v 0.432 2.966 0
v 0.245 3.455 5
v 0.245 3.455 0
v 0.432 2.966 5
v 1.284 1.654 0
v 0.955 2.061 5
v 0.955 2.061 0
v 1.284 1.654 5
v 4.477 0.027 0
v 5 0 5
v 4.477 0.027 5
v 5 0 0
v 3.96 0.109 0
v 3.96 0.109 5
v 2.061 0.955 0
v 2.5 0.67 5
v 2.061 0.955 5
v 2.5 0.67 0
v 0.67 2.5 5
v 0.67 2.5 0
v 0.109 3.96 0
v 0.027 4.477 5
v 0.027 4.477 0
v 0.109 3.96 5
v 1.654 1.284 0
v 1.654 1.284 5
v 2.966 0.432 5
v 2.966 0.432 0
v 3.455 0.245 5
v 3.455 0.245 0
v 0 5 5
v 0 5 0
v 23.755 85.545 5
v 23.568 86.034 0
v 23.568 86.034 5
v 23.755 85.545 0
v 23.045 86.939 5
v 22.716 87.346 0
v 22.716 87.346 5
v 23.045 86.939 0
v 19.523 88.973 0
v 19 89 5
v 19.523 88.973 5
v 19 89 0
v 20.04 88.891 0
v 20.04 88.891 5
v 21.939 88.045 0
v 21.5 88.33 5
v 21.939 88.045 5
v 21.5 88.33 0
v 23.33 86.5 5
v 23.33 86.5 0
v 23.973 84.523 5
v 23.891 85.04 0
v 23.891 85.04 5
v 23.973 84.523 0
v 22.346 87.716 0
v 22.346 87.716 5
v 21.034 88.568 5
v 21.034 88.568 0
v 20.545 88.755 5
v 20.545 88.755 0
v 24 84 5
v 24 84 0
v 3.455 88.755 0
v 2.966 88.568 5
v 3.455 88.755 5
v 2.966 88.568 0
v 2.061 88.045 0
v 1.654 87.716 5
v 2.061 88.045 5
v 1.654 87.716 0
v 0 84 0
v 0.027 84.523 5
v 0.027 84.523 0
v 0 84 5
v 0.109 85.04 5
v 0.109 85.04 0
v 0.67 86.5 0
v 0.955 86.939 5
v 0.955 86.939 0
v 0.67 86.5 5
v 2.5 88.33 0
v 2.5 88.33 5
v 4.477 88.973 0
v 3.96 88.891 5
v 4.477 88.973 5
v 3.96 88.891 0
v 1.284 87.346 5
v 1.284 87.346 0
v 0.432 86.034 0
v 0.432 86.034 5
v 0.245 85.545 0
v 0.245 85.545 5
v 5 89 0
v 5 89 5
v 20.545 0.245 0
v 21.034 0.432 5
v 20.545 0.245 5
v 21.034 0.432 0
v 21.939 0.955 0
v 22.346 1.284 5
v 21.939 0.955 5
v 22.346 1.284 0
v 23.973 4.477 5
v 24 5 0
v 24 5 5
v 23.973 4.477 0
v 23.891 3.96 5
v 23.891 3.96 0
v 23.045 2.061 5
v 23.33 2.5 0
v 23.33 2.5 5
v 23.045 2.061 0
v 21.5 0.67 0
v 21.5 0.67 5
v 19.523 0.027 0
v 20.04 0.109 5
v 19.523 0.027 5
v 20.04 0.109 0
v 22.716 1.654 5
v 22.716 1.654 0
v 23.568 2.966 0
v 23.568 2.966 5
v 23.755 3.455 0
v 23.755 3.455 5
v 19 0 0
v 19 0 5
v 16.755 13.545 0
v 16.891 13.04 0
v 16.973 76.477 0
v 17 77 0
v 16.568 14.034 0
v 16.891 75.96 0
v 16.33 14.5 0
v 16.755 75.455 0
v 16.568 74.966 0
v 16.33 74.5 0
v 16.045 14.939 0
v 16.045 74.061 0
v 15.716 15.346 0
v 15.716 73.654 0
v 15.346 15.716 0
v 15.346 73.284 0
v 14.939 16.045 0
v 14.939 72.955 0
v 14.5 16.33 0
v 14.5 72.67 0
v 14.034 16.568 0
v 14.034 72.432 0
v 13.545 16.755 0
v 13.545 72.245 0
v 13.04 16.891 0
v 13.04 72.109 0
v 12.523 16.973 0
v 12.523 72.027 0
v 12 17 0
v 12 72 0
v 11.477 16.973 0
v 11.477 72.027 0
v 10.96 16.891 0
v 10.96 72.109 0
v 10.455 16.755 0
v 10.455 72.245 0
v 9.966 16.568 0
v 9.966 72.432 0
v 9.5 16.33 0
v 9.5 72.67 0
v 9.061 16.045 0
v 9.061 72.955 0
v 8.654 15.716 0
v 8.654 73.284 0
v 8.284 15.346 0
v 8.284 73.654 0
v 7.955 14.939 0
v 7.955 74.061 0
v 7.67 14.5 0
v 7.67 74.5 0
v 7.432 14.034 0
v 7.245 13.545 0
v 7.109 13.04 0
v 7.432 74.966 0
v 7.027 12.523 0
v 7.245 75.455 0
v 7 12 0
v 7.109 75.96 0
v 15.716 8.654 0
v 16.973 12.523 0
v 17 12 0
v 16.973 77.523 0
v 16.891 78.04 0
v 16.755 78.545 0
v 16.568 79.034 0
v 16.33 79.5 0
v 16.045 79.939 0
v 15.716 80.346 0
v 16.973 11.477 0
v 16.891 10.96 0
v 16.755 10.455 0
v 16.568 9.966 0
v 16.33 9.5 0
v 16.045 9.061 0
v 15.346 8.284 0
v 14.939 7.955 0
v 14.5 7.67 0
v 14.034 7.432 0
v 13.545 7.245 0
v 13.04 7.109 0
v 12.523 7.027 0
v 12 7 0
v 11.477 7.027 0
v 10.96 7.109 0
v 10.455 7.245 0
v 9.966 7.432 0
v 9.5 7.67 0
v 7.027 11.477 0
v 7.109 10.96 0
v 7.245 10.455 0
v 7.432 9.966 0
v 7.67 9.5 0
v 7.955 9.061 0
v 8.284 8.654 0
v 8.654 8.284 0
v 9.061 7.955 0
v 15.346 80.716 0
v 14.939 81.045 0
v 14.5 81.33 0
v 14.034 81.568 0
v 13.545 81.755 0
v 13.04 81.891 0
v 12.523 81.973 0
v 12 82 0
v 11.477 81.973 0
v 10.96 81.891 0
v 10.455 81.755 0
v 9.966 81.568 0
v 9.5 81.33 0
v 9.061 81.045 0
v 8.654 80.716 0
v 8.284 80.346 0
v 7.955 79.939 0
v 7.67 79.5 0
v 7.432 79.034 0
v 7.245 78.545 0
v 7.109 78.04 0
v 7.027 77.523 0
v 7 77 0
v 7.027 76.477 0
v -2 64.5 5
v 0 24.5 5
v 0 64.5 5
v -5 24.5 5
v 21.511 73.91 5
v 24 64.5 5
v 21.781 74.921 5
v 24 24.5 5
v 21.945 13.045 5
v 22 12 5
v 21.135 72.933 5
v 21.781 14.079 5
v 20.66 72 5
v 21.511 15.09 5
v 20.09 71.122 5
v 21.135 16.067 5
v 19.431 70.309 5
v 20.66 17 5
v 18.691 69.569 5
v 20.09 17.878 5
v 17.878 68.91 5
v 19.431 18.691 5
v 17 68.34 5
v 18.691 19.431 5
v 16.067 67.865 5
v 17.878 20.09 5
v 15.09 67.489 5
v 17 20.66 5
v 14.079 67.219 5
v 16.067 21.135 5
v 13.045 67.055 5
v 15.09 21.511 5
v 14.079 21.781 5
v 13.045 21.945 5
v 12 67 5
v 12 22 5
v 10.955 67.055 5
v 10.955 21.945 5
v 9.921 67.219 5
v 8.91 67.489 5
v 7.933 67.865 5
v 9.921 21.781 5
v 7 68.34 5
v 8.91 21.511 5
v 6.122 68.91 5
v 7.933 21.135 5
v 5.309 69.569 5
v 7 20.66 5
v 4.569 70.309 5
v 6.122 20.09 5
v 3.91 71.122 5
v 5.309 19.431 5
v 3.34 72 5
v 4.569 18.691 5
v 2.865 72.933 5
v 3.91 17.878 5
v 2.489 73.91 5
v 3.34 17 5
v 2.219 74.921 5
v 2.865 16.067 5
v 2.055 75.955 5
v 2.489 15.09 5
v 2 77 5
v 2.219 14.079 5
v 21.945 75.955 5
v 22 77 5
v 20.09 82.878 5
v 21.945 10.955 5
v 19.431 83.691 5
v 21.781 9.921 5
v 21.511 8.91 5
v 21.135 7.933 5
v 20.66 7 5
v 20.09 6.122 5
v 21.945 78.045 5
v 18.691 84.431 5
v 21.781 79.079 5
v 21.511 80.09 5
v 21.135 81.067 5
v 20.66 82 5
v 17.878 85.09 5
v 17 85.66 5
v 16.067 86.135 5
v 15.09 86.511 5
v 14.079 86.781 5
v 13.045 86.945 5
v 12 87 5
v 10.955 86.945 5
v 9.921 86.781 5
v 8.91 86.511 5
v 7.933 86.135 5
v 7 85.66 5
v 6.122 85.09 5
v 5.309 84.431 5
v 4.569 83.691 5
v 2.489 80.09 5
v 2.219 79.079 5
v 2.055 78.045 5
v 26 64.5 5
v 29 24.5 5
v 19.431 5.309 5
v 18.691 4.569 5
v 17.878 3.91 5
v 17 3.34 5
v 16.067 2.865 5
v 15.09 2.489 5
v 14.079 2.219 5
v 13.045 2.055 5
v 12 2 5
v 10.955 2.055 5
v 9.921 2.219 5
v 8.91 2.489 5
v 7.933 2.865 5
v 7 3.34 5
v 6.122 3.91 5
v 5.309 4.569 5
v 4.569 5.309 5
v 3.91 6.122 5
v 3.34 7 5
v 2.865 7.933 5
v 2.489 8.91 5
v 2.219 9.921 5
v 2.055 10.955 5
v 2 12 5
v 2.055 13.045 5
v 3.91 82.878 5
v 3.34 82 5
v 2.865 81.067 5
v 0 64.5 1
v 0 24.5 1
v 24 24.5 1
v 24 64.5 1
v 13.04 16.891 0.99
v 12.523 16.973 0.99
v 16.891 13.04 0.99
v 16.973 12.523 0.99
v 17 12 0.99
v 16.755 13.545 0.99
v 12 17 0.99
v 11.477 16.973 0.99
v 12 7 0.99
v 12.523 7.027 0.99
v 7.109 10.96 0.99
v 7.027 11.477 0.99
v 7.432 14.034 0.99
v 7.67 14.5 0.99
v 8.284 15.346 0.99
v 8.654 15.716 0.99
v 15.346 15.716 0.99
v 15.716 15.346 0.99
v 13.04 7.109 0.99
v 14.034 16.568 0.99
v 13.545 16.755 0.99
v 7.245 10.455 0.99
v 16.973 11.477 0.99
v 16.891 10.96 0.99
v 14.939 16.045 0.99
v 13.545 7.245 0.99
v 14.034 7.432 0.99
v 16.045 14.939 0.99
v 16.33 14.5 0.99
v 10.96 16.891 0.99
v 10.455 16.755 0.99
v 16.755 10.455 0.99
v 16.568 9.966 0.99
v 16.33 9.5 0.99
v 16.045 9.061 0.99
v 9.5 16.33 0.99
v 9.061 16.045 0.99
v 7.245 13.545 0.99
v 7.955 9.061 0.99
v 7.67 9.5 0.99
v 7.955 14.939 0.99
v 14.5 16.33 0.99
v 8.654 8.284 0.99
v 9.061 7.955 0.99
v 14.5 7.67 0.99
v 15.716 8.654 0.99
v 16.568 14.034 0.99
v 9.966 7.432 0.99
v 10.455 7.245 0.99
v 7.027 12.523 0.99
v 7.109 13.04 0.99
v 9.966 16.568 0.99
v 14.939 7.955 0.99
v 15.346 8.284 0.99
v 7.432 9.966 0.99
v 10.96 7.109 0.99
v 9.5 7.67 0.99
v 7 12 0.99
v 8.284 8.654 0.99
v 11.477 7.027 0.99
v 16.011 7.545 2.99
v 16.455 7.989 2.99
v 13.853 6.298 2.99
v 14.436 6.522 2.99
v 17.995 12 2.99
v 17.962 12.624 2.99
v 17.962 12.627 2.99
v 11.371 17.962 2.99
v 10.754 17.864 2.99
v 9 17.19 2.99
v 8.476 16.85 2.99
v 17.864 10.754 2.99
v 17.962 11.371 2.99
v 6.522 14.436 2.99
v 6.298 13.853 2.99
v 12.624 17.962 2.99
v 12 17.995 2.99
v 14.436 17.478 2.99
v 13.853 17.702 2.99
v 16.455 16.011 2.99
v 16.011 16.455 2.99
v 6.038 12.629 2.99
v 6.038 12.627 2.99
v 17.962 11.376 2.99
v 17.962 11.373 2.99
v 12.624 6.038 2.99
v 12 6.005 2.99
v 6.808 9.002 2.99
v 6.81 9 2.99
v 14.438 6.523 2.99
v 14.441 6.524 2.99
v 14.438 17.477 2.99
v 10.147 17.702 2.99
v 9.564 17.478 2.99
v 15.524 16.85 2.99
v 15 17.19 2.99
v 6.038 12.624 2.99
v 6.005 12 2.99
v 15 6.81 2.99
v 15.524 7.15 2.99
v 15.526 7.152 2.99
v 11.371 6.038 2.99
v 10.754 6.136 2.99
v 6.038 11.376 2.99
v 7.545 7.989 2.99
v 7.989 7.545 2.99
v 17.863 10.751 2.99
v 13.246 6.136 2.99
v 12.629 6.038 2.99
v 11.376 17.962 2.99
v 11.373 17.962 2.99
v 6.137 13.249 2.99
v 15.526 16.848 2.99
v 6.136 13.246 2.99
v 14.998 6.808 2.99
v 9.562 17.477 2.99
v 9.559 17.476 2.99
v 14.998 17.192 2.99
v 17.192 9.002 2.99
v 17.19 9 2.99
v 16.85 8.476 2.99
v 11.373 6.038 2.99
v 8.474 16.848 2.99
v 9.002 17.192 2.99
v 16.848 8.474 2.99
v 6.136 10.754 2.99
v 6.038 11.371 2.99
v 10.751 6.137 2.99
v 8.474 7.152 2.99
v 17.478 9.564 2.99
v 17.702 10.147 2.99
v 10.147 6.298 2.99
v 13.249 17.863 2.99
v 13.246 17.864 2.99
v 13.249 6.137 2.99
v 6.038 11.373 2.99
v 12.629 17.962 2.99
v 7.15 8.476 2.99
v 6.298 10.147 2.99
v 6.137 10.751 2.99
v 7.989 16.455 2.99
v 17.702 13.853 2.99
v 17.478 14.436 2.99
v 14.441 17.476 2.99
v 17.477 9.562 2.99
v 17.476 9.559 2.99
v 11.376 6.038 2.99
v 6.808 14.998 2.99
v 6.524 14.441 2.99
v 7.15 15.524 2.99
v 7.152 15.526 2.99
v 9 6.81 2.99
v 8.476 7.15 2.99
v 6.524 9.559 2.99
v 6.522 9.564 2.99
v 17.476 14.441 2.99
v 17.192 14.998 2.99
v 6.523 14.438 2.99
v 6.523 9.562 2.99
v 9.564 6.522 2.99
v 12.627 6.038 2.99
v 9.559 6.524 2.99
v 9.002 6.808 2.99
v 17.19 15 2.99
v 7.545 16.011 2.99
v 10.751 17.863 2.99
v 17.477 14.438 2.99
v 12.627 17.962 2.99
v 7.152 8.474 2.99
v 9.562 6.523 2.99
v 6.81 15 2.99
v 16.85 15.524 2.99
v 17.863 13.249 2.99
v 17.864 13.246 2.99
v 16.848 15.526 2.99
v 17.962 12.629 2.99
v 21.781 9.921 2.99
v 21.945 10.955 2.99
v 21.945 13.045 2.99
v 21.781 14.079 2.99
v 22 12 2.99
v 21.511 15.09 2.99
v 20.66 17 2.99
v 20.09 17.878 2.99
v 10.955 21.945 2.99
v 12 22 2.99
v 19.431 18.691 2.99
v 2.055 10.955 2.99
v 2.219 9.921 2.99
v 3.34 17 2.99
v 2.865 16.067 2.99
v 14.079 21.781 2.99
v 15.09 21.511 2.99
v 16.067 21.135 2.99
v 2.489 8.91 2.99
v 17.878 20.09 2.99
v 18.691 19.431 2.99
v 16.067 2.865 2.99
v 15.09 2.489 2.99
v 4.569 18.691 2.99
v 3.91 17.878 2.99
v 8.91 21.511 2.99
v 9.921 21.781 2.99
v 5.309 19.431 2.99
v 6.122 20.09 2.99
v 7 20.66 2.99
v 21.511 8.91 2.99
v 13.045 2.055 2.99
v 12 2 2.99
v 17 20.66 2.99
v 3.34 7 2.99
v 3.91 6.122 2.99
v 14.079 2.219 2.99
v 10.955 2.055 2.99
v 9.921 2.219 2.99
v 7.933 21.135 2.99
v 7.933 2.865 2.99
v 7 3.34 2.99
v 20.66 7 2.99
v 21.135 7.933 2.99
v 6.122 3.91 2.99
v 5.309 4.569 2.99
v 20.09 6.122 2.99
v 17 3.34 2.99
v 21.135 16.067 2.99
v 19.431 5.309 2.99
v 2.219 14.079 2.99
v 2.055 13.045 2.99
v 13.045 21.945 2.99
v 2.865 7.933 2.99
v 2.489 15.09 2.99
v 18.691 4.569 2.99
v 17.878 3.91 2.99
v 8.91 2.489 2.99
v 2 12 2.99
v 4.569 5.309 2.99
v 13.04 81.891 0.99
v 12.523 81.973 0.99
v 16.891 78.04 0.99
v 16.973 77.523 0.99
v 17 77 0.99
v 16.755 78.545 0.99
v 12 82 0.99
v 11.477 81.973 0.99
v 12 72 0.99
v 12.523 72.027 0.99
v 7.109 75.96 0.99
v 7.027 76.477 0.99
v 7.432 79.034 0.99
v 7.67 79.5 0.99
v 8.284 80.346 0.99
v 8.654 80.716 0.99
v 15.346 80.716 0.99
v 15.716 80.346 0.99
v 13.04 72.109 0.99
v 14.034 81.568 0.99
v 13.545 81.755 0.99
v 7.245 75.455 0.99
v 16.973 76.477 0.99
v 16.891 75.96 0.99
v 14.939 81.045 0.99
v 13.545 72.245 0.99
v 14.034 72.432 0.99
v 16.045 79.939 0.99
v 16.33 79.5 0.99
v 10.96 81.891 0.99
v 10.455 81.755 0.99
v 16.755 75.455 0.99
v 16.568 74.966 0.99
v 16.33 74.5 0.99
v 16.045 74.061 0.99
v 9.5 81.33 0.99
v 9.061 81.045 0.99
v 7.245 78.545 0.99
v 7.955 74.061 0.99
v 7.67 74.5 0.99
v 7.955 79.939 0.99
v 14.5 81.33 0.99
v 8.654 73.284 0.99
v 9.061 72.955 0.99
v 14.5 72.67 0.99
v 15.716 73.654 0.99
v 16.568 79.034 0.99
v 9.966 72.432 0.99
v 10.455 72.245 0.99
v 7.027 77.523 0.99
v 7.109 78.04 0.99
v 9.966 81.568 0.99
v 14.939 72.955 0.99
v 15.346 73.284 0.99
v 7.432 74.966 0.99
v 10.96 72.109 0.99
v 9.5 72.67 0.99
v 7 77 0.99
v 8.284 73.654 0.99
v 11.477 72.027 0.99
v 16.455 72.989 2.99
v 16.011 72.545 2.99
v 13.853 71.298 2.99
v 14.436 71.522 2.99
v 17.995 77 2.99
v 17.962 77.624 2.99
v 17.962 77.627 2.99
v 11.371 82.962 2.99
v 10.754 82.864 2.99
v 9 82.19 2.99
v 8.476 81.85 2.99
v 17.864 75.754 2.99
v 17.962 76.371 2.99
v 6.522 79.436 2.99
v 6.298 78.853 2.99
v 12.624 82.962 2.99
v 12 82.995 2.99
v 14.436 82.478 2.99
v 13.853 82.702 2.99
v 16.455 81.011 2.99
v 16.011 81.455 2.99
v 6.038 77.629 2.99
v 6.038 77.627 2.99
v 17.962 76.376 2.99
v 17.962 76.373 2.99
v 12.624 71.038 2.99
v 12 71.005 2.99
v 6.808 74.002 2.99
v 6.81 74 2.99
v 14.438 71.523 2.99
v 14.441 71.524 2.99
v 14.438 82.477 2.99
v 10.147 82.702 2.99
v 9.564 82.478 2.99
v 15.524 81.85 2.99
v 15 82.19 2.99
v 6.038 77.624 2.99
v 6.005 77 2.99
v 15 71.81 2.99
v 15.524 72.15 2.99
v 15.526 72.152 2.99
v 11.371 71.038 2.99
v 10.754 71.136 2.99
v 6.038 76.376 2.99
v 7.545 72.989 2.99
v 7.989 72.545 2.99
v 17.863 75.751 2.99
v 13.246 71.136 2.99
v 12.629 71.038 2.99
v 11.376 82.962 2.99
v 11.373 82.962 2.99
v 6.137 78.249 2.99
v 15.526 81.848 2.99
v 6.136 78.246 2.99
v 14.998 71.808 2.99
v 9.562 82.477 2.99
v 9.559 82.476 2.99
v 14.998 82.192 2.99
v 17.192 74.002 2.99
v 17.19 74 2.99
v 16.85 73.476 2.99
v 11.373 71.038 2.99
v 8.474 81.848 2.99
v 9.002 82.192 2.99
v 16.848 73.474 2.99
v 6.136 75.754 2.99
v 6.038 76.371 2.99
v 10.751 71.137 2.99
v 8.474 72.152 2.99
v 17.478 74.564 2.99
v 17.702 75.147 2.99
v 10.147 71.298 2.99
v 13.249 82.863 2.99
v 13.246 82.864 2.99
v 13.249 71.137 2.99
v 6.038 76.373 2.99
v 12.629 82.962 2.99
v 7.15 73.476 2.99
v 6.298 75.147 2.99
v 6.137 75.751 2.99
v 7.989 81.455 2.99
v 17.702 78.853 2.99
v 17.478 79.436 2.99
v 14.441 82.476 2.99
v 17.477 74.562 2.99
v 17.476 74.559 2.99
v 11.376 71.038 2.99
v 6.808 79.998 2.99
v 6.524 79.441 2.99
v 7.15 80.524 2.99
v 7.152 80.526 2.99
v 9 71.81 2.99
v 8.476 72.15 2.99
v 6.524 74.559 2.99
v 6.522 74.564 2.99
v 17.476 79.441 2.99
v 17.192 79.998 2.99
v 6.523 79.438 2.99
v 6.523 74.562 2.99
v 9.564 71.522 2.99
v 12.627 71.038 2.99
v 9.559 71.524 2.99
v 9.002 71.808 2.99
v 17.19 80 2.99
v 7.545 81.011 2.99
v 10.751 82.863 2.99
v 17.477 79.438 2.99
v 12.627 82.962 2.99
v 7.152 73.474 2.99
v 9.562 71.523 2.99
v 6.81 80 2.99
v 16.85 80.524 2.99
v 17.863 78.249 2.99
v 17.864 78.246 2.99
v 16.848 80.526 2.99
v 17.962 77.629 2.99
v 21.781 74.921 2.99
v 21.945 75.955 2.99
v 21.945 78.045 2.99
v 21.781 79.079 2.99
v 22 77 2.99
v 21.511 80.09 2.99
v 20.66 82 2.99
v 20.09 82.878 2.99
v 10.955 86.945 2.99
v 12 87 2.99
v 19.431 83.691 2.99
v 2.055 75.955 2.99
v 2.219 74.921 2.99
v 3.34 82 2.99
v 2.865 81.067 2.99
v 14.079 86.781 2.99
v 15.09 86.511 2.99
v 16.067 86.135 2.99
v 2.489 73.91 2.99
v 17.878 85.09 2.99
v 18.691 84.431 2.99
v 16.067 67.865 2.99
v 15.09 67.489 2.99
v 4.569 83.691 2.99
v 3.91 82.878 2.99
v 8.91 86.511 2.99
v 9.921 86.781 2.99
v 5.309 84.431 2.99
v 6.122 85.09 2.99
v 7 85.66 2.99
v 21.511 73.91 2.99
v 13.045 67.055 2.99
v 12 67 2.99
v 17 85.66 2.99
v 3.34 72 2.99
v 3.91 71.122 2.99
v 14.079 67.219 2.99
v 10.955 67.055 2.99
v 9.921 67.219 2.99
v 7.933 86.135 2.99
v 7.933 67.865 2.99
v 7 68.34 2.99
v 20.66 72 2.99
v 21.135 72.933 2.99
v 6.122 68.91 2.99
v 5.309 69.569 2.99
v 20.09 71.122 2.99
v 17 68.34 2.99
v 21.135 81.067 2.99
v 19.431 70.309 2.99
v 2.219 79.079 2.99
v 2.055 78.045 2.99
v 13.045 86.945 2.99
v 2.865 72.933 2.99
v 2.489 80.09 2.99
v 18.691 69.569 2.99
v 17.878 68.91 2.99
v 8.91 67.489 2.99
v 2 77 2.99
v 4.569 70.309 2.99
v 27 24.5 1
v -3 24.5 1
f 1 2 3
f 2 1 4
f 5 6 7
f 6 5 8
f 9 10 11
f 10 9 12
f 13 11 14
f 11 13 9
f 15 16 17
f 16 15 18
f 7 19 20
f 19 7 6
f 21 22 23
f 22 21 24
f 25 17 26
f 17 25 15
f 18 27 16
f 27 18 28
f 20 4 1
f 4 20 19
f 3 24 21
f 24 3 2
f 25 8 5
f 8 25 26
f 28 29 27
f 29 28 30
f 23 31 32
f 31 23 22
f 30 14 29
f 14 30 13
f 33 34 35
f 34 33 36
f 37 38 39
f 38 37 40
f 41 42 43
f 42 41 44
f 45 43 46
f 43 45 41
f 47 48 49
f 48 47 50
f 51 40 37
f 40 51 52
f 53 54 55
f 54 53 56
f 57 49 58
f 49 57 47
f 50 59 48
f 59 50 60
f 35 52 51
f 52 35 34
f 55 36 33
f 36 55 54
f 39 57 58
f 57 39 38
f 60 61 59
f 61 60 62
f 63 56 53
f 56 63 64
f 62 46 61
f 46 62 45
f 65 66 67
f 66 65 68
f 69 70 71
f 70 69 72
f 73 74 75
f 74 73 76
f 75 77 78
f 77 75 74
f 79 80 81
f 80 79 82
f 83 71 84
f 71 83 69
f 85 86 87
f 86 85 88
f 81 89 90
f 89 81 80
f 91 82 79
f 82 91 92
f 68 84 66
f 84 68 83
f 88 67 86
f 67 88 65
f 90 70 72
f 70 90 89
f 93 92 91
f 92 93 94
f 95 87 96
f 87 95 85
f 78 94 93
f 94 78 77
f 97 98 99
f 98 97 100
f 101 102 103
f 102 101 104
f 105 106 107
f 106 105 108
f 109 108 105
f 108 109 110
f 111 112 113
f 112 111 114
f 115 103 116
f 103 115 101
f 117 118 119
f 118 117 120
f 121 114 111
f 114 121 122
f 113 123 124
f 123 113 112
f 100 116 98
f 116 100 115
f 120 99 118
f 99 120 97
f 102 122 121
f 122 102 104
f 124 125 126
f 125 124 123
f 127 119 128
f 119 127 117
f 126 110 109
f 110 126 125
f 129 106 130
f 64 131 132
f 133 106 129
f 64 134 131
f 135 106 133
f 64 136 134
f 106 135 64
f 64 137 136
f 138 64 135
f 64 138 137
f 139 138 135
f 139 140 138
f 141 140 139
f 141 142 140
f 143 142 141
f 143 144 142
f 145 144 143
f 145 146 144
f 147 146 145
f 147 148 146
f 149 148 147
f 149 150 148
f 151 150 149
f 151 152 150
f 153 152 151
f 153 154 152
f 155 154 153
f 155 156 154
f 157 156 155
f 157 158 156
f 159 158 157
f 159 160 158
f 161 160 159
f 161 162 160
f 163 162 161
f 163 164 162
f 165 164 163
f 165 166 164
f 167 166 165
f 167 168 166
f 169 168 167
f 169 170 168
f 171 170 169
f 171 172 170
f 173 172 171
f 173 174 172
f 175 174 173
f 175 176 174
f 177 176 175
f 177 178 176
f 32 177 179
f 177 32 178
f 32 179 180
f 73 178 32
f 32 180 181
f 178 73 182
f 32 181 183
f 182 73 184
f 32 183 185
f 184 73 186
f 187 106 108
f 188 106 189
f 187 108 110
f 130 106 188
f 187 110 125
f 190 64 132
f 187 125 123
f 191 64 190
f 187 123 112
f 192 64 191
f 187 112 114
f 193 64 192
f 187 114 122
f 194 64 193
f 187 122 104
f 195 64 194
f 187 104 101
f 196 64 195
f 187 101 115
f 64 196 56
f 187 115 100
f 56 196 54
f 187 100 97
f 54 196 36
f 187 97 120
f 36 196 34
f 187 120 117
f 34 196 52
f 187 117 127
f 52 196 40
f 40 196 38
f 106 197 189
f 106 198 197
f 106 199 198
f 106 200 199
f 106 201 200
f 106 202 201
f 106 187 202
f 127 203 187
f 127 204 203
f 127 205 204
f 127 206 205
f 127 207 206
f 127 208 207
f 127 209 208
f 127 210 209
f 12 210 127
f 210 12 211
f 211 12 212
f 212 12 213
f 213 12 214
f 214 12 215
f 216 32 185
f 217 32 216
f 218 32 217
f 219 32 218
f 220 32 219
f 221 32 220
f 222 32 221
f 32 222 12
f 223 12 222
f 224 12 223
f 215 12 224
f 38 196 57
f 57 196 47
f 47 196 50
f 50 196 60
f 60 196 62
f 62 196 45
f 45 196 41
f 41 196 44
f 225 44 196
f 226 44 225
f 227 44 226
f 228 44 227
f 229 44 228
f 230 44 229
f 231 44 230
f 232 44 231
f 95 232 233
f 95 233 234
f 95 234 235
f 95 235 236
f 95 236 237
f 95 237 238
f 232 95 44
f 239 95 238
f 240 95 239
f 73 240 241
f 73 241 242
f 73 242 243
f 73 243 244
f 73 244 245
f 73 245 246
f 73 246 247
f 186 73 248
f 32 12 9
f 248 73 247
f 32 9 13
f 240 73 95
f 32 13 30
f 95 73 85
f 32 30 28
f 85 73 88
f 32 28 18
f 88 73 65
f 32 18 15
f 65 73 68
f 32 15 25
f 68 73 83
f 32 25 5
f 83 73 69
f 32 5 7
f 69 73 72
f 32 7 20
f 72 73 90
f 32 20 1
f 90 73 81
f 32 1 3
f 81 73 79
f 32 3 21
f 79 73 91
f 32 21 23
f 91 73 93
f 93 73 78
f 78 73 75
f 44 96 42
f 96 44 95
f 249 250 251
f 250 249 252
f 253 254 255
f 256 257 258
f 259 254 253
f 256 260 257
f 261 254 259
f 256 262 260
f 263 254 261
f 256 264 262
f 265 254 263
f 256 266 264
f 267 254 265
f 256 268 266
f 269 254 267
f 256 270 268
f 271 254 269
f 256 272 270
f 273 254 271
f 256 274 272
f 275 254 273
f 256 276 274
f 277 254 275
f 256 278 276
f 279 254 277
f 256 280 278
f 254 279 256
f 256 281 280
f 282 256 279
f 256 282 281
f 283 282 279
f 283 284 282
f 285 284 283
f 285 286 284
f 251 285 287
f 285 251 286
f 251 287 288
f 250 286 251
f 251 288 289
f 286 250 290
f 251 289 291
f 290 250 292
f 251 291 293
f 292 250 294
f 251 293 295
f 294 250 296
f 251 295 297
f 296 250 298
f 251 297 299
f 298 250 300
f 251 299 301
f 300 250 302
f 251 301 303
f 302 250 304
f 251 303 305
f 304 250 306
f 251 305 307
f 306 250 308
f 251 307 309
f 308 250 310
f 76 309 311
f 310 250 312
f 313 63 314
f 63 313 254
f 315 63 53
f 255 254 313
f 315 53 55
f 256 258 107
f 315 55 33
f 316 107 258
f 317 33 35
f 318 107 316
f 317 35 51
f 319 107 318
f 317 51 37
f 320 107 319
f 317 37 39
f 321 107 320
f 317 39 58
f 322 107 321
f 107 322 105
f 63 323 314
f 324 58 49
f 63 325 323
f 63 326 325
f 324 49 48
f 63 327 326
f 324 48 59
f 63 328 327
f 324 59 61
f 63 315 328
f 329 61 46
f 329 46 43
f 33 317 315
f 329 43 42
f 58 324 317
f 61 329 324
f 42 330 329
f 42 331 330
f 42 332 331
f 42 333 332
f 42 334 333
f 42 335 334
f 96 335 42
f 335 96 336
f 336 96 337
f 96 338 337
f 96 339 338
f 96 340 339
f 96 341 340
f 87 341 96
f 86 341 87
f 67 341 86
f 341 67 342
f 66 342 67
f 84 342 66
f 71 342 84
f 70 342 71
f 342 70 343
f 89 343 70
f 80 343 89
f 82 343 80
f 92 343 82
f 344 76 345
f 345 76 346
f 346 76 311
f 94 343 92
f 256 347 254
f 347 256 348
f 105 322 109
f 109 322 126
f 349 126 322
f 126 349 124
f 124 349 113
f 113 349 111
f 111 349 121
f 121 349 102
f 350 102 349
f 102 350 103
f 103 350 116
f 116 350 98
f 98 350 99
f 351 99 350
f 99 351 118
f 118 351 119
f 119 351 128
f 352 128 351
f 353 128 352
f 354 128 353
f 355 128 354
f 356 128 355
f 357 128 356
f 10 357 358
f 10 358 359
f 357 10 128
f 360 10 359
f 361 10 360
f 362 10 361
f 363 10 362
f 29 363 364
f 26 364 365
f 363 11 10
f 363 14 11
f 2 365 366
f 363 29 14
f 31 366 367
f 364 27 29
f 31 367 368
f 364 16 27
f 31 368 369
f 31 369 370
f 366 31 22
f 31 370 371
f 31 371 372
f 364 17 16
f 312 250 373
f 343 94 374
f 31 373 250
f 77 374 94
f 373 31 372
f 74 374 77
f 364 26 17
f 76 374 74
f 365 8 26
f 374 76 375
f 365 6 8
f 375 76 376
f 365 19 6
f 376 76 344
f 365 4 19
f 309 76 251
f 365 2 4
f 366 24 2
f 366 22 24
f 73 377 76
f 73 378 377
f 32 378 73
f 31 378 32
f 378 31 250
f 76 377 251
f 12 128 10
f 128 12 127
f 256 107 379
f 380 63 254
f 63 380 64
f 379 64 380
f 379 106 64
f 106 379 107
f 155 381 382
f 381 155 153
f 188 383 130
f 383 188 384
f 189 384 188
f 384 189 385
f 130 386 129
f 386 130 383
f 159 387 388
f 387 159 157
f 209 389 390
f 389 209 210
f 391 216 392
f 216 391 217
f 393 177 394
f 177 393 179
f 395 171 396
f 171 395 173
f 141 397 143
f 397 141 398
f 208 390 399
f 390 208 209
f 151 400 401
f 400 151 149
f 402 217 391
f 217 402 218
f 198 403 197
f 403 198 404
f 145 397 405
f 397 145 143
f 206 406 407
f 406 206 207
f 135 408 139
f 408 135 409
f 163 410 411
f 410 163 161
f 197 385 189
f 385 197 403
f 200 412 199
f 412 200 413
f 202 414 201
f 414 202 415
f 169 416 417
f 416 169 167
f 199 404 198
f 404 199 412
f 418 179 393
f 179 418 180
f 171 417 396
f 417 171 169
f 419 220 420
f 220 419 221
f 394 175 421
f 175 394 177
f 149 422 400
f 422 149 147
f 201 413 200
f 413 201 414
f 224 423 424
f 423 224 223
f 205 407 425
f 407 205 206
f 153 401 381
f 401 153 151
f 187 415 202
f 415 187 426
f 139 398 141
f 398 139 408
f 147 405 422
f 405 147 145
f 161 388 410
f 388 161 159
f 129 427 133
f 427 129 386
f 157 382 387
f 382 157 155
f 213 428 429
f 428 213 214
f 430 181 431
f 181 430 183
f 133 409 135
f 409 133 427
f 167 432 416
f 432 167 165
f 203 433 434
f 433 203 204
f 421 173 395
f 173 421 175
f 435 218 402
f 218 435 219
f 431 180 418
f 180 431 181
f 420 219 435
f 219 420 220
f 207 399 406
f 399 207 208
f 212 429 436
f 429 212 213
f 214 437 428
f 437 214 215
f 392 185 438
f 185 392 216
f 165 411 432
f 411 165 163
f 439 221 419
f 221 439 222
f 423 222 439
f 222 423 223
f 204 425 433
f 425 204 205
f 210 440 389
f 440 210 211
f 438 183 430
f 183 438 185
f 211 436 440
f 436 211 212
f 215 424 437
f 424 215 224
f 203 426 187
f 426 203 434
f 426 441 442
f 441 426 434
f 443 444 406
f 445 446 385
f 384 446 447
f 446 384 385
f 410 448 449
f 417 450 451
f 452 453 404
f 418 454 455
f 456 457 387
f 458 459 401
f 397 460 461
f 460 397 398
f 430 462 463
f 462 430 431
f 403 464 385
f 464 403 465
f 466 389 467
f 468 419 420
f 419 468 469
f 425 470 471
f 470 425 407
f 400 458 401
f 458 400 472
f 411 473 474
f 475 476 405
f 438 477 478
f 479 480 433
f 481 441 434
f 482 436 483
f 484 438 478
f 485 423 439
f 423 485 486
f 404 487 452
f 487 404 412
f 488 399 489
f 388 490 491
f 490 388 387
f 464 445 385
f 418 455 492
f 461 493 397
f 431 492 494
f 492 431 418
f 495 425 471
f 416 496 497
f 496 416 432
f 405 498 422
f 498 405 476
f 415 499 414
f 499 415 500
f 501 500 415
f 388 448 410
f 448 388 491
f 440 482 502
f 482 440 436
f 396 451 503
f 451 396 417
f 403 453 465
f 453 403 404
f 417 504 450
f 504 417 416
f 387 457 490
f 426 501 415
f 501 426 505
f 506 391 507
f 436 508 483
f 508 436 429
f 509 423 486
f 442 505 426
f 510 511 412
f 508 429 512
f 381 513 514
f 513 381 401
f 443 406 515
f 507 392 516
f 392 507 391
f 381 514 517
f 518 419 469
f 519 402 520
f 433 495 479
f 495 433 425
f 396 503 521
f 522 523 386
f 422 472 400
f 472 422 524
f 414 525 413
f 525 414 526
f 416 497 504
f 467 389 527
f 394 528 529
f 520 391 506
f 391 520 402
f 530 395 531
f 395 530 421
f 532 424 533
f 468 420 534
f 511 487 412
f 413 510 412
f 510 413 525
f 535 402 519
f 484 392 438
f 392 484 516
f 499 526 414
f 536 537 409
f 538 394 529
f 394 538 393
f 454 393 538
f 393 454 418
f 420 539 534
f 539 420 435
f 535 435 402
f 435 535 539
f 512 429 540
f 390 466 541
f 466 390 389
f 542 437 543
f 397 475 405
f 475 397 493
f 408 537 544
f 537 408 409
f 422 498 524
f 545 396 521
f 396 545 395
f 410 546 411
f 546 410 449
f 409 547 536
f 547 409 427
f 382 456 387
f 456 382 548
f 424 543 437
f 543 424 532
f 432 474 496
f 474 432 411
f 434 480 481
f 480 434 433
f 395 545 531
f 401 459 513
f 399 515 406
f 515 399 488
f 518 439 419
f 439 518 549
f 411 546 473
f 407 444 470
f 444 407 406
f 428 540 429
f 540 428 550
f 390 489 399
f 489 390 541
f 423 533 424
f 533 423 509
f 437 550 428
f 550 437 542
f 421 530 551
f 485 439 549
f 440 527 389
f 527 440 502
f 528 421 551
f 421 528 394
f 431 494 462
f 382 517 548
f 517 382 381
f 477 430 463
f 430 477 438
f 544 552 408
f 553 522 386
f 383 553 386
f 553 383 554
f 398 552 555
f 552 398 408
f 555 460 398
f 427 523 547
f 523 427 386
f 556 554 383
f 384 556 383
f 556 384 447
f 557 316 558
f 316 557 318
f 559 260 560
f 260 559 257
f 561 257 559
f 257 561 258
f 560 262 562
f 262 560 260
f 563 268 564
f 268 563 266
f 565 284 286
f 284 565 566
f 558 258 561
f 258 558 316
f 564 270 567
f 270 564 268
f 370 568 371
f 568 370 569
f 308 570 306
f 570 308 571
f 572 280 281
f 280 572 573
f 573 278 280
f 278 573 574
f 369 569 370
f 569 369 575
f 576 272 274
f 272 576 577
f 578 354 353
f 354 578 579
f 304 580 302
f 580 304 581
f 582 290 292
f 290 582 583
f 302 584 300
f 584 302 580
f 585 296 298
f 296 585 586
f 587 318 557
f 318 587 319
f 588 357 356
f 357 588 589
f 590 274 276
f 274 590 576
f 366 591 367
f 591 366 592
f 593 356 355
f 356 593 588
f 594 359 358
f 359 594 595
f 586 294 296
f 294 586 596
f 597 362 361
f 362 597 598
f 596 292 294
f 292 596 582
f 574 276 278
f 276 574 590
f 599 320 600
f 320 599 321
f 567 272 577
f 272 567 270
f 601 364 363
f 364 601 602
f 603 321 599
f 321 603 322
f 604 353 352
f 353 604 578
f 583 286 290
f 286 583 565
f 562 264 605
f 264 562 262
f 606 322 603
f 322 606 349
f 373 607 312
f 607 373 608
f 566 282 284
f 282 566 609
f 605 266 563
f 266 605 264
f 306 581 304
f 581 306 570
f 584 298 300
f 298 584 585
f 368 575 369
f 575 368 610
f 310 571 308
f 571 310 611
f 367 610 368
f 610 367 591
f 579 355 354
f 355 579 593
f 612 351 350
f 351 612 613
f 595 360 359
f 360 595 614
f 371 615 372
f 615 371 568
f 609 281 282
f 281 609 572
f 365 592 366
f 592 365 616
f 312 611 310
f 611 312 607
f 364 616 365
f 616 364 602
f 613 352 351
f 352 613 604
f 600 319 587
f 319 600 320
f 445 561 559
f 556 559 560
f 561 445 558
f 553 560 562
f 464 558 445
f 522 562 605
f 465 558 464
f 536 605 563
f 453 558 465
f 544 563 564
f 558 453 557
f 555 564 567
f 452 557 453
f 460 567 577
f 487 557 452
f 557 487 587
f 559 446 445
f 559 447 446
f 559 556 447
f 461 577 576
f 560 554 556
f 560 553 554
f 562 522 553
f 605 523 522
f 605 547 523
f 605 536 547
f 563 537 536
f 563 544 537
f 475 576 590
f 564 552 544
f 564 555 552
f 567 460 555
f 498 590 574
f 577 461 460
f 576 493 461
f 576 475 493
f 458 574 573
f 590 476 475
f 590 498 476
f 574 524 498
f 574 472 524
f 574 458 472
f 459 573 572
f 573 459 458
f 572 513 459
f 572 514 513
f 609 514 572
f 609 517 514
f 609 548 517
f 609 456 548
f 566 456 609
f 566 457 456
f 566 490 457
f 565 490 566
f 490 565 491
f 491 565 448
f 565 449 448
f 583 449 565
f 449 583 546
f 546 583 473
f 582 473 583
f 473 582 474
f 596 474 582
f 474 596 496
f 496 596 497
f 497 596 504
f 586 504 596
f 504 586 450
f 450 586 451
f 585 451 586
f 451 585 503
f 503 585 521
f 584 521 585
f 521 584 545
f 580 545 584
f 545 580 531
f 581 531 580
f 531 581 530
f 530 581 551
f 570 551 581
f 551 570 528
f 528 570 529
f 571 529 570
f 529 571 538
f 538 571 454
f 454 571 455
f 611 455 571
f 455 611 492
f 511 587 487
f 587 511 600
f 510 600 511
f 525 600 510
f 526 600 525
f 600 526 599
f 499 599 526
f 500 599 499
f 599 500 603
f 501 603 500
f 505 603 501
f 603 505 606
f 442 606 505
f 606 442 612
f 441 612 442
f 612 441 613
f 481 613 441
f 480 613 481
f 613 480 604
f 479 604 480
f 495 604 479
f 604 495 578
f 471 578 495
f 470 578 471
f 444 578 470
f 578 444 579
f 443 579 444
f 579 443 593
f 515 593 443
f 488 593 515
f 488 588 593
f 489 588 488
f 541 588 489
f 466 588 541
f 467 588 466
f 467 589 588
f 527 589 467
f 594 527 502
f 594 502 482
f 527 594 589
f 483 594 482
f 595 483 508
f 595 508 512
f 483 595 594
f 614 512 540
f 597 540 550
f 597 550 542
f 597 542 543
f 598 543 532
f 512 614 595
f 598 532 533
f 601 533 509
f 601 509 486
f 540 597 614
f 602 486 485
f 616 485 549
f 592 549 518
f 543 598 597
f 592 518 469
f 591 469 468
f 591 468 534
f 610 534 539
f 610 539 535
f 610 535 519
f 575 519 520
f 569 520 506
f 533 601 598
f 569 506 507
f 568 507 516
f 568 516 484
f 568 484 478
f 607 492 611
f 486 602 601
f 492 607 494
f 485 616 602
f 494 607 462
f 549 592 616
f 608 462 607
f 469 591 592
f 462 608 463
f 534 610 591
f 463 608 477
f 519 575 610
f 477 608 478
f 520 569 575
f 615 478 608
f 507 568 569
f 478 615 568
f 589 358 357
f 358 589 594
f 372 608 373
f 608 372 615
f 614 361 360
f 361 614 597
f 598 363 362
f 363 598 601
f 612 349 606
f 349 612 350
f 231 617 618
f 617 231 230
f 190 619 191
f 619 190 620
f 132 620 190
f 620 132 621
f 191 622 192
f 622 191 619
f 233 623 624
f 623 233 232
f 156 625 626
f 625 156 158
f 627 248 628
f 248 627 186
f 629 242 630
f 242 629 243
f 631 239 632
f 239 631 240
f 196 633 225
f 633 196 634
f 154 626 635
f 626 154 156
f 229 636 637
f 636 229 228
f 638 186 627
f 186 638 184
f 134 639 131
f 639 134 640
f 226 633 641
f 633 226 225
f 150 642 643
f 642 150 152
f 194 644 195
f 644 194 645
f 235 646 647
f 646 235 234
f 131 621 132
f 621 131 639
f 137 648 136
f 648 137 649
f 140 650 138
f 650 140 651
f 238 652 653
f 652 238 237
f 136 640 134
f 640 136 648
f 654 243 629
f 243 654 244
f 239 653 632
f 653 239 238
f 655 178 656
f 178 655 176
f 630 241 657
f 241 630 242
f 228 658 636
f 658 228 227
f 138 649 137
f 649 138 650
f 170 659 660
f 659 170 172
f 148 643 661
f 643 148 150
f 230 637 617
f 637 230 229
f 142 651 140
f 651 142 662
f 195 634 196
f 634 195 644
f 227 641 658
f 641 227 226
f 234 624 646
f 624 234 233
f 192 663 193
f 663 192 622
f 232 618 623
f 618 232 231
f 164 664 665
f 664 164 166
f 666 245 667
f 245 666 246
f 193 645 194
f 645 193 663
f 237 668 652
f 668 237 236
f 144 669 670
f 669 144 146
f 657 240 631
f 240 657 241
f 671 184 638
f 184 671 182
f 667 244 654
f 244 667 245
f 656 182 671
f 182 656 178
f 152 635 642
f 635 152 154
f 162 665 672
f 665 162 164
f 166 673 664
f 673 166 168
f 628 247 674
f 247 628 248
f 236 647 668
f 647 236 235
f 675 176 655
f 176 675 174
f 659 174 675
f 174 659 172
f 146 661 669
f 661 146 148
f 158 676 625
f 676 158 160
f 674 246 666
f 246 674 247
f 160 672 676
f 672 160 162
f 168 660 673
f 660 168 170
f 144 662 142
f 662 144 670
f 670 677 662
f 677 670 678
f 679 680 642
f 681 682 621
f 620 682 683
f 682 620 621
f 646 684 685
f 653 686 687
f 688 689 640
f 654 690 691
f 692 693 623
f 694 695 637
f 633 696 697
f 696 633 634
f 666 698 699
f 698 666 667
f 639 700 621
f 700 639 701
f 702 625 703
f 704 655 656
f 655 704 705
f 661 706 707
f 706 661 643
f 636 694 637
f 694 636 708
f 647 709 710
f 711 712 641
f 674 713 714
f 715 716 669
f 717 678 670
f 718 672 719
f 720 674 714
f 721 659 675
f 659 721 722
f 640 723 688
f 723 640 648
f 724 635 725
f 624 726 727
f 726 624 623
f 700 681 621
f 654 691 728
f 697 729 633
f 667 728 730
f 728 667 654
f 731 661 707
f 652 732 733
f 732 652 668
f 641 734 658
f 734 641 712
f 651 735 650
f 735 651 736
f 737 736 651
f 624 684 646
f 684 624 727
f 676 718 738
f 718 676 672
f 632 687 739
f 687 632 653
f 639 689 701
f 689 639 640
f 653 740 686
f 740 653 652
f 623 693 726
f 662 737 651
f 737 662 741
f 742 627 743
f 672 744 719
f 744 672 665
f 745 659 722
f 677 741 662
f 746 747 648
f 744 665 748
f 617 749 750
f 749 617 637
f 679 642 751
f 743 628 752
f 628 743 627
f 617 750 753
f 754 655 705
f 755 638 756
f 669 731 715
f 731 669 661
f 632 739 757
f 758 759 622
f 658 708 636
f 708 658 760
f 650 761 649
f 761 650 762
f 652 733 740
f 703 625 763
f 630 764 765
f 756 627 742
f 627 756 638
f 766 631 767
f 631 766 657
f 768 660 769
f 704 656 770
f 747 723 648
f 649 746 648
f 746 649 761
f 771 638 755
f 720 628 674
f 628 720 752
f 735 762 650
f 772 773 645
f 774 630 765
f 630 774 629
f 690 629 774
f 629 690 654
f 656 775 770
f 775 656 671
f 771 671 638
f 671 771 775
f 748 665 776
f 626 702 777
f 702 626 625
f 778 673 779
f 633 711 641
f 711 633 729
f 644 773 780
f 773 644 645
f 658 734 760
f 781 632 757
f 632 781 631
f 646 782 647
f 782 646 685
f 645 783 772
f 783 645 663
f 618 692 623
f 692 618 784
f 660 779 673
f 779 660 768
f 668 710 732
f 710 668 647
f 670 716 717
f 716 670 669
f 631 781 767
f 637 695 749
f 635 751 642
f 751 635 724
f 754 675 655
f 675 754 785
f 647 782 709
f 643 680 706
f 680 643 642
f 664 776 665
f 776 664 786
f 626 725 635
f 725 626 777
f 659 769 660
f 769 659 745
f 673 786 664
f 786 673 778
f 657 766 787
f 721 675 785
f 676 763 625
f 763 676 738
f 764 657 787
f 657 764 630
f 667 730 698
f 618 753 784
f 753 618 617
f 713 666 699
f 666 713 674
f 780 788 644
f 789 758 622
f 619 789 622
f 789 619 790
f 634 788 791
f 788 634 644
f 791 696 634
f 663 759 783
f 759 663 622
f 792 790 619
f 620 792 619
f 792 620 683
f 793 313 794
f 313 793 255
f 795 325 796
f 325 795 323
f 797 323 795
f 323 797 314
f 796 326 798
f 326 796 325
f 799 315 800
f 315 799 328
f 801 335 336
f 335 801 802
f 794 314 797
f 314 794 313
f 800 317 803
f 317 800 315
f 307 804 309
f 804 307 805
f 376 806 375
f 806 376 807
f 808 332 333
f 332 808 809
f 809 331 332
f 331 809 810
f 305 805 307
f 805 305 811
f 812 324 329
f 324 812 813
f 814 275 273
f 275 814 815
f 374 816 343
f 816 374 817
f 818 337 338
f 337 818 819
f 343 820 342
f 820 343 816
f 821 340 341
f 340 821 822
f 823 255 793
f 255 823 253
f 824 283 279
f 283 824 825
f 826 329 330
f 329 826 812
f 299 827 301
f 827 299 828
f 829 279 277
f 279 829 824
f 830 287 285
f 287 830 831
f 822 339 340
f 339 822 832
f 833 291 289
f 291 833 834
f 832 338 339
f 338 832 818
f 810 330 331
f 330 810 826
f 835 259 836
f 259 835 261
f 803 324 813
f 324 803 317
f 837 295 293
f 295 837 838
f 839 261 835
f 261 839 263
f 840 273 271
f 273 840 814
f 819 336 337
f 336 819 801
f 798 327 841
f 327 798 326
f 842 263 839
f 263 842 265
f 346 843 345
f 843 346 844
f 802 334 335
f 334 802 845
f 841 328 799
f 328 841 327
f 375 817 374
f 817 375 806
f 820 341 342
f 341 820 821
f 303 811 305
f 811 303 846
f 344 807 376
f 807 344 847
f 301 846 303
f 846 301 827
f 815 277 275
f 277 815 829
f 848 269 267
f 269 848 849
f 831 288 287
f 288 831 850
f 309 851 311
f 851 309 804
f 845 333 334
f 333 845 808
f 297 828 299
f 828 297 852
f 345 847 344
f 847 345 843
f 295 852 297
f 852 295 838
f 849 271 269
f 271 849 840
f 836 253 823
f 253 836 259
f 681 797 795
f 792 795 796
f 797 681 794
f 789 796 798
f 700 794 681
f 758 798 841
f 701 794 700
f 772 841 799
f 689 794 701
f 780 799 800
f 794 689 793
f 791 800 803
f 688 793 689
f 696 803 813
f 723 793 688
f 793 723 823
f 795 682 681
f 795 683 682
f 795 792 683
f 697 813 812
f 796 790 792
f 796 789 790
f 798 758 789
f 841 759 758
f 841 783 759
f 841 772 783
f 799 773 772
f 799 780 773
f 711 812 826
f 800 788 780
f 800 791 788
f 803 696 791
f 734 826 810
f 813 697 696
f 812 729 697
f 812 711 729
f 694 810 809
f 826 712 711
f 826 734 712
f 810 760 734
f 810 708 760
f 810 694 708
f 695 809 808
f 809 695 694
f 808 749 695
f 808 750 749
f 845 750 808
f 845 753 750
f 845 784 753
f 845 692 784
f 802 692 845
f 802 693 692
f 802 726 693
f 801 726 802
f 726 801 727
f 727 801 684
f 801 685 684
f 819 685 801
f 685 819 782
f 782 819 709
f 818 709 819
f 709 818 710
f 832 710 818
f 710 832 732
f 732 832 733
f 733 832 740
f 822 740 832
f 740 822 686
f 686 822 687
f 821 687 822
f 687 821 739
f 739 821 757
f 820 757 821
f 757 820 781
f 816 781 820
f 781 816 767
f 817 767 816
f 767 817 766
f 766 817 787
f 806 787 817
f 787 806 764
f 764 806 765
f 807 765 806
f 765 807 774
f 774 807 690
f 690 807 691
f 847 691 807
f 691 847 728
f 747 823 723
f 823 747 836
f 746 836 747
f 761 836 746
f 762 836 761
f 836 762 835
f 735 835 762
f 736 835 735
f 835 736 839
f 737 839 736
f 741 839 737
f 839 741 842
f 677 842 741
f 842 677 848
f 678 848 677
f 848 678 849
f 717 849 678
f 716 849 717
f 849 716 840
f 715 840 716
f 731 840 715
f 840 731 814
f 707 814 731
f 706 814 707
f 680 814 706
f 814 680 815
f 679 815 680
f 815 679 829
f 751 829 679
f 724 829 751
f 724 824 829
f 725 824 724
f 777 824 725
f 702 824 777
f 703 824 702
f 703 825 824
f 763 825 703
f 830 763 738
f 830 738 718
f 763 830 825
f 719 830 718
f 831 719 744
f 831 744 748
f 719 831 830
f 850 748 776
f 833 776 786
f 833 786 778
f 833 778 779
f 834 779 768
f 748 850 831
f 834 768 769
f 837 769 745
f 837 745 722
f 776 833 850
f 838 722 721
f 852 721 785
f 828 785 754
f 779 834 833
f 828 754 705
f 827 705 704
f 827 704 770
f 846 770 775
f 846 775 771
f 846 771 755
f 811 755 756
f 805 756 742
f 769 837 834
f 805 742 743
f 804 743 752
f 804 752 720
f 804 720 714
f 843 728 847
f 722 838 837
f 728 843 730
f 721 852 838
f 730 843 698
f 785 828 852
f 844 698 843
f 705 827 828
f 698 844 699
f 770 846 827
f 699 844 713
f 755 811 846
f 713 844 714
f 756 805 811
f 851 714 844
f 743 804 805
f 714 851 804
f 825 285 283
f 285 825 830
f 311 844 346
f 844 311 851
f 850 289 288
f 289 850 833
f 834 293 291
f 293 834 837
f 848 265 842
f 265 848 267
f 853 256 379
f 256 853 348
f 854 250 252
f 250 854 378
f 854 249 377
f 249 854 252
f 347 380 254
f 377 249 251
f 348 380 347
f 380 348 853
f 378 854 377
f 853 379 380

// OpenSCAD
// file: parts/box.scad
module box(w, l, h){
    polyhedron(
        points=[
            // lowest layer
            [0, 0, 0],
            [0, w, 0],
            [l, w, 0],
            [l, 0, 0],

            // top layer
            [0, 0, h],
            [0, w, h],
            [l, w, h],
            [l, 0, h]
        ],
        faces=[
            // bottom
            [0, 3, 2, 1],

            // sides beginning with front
            [0, 1, 5, 4],
            [1, 2, 6, 5],
            [3, 7, 6, 2],
            [0, 4, 7, 3],

            // top
            [4, 5, 6, 7]
        ]
    );
}

box(30, 50, 5);
// file: parts/slide.scad
module slide(l, h, w1, w2){
    translate([-w1/2, -l/2, -h/2])
    polyhedron(
        points=[
            // lowest layer
            [0, 0, 0],
            [w1, 0, 0],
            [w2-((w2-w1)/2), l, 0],
            [-((w2-w1)/2), l, 0],

            // top layer
            [h/2, 0, h],
            [w1-h/2, 0, h],
            [w2-((w2-w1)/2)-h/2, l, h],
            [-((w2-w1)/2)+h/2, l, h],
            [0, h/2, h],
            [0, w1-h/2, h],
            [l, w2-((w2-w1)/2), h],
            [l, -((w2-w1)/2)+h/2, h]
        ],
        faces=[
            // bottom
            [0, 3, 2, 1],

            // sides beginning with front
            [0, 1, 5, 4],
            [1, 2, 6, 5],
            [3, 7, 6, 2],
            [0, 4, 7, 3],

            // top
            [4, 5, 6, 7]
        ]
    );
}

slide(60, 5, 20, 24);
// file: parts/box_rounded.scad
use <box.scad>;

module box_rounded(w, l, h, r) {
    difference() {
        box(w, l, h);

        translate([l, w, 0]) rotate([0, 0, 180]) difference() {
            translate([0, 0, h / 2]) cube([2*r, 2*r, 2*h], center = true);
            translate([r, r, h / 2]) cylinder(h = 3*h, r = r, center = true, $fn=60);
        }

        translate([0, w, 0]) rotate([0, 0, 270]) difference() {
            translate([0, 0, h / 2]) cube([2*r, 2*r, 2*h], center = true);
            translate([r, r, h / 2]) cylinder(h = 3*h, r = r, center = true, $fn=60);
        }

        translate([l, 0, 0]) rotate([0, 0, 90]) difference() {
            translate([0, 0, h / 2]) cube([2*r, 2*r, 2*h], center = true);
            translate([r, r, h / 2]) cylinder(h = 3*h, r = r, center = true, $fn=60);
        }

        difference() {
            translate([0, 0, h / 2]) cube([2*r, 2*r, 2*h], center = true);
            translate([r, r, h / 2]) cylinder(h = 3*h, r = r, center = true, $fn=60);
        }
    }
}

box_rounded(30, 50, 5, 5);
// file: parts/screw_hole.scad
module screw_hole(r1, h1, r2, h2, r3, h3){
    d = 0.01;

    union() {
        cylinder(h=h1, r=r1, $fn=60);
        translate([0, 0, h1-d]) cylinder(h=h2+d, r1=r1, r2=r2, $fn=60);
        translate([0, 0, h1+h2-d]) cylinder(h=h3+d, r=r3, $fn=60);
    }
}

screw_hole(r1=10, h1=10, r2=20, h2=10, r3=30, h3=10);
// main file
use <parts/screw_hole.scad>;
use <parts/box_rounded.scad>;
use <parts/slide.scad>;

width = 24;
depth = 89;
distance = 65;
height = 5;

union() {
    difference() {
        box_rounded(depth, width, height, 5);

        translate([width/2, (depth-distance)/2, -1])
            screw_hole(r1=5, h1=2, r2=6, h2=2, r3=10, h3=3);
        translate([width/2, depth-(depth-distance)/2, -1])
            screw_hole(r1=5, h1=2, r2=6, h2=2, r3=10, h3=3);
    }

    translate([width/2, depth/2, 3])
        rotate([0, 180, 0])
        slide(l = 40, h = 4, w1 = width+10, w2 = width+4);
}
